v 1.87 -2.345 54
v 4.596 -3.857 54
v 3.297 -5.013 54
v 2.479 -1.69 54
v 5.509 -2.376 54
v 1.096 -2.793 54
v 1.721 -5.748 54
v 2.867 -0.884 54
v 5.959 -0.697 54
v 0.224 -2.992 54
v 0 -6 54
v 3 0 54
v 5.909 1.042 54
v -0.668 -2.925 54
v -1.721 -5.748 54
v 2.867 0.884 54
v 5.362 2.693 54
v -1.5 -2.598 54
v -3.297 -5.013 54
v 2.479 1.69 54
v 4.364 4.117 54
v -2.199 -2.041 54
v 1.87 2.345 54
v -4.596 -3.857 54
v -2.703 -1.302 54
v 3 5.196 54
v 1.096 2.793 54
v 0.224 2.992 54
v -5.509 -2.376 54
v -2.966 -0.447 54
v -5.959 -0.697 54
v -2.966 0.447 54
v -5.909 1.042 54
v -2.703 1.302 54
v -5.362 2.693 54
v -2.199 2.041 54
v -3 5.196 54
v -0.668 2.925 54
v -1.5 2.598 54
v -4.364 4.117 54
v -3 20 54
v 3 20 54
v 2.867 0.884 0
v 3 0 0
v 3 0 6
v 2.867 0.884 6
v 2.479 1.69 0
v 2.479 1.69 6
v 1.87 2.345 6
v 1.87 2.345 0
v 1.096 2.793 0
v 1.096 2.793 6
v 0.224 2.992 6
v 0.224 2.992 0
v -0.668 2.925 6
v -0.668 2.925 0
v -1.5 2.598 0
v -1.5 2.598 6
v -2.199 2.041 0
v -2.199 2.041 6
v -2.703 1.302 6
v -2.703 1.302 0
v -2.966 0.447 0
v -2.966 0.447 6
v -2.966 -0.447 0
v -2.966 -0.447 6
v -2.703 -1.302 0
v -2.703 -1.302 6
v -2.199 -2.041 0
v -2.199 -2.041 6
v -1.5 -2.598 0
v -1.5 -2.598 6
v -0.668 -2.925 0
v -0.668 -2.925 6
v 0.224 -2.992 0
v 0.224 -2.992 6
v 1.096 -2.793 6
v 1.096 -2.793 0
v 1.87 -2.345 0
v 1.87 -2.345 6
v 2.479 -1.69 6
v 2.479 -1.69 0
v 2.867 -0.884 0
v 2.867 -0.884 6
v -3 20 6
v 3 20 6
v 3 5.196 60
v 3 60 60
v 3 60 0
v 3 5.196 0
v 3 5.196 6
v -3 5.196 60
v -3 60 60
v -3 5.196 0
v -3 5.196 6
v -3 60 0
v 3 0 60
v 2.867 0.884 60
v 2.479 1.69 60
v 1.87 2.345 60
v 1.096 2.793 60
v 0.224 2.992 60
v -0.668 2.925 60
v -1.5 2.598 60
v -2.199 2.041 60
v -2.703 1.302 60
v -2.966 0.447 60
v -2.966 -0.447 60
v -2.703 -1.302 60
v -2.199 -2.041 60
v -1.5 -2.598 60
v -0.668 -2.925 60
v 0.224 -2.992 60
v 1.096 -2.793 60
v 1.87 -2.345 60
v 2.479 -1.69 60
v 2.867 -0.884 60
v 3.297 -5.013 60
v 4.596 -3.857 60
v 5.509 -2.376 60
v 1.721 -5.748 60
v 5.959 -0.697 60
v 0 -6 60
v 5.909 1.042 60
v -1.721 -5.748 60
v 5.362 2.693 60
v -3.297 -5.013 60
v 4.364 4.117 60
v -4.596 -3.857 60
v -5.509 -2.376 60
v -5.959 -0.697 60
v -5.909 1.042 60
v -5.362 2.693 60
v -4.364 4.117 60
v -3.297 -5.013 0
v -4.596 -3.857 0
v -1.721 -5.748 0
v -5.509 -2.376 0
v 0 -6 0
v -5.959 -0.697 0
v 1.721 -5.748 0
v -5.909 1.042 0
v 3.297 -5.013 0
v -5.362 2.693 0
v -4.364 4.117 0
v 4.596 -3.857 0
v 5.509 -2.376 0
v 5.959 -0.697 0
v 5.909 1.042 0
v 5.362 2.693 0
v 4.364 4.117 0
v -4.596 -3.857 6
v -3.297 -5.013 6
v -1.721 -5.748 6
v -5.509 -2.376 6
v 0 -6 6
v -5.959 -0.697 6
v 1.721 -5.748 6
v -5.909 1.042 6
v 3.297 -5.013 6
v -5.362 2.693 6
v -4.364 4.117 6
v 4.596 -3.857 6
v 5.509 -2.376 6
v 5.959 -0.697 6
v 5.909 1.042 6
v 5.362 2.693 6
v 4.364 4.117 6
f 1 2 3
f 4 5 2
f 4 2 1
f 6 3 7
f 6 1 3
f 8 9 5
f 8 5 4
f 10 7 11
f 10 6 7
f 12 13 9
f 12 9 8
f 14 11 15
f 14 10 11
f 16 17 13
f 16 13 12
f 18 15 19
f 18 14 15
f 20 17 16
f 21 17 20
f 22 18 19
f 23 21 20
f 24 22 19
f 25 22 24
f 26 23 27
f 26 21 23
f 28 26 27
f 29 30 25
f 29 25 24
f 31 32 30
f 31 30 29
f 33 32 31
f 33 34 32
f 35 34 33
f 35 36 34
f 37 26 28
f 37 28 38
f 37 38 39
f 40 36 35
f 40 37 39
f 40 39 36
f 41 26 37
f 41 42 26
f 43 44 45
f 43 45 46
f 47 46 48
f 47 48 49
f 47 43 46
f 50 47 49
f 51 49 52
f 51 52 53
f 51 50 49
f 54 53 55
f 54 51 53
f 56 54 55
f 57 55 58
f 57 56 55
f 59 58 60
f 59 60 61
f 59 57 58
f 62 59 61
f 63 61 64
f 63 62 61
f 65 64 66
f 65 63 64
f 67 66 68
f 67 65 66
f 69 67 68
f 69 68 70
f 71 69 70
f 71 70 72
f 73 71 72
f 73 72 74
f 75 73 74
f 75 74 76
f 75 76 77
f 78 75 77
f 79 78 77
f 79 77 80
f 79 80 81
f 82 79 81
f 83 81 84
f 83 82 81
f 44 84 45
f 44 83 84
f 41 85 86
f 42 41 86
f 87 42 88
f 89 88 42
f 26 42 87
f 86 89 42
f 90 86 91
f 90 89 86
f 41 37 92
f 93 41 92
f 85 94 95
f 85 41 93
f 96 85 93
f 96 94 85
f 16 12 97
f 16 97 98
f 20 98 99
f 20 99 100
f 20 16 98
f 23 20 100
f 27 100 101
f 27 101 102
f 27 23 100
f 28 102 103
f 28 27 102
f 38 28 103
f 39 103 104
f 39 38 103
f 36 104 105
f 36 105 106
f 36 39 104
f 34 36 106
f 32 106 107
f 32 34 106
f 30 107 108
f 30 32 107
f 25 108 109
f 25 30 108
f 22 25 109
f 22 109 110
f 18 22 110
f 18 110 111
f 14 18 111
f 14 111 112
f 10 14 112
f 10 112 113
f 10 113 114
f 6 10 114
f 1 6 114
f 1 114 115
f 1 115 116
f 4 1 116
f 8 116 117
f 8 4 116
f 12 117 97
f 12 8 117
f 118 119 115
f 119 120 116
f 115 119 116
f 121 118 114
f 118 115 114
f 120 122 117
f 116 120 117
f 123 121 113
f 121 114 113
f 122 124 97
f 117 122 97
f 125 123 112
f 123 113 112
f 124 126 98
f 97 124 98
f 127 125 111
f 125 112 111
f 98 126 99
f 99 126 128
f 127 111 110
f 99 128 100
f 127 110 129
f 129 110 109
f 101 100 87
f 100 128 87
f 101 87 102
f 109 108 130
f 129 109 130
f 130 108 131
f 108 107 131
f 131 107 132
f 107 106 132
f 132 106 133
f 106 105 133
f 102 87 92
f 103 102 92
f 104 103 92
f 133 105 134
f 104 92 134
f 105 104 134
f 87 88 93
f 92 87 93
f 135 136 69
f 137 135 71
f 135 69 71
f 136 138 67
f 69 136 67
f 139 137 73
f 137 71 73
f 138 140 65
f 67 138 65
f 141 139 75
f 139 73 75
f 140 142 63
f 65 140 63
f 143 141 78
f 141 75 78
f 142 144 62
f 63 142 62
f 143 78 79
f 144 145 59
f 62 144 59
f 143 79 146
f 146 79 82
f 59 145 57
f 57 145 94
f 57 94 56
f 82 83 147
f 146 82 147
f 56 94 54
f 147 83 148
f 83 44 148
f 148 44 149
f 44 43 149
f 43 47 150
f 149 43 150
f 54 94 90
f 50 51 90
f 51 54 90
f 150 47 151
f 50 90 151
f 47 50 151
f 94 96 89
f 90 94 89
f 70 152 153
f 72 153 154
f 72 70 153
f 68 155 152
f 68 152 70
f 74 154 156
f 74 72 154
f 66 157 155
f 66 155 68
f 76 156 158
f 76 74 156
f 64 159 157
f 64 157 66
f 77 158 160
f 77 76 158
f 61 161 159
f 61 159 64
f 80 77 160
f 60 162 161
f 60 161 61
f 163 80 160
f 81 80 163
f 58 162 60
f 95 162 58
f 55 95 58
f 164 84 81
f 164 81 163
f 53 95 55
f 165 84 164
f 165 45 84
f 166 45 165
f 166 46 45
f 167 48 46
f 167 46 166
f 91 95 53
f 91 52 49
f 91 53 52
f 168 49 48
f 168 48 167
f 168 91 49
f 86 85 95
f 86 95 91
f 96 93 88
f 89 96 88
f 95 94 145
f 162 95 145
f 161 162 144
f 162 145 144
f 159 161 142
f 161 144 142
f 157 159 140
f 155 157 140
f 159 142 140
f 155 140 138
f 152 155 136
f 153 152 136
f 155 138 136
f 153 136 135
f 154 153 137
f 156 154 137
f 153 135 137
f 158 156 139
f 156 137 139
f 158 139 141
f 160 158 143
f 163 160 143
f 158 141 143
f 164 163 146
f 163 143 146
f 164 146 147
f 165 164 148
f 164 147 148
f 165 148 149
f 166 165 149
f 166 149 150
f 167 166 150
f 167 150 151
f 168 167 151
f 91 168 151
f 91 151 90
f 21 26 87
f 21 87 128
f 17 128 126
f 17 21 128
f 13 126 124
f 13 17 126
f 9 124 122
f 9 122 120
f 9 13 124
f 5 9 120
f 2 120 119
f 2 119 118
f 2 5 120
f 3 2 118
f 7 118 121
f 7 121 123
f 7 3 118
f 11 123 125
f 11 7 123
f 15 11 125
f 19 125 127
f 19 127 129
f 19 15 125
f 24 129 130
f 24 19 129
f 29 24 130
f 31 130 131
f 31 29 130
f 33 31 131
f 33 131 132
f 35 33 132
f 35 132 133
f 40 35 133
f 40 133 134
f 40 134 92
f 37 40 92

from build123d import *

# Parameters (mm, degrees)
CROQUIS1_R              = 3
SALIENTE_EXTRUIR1_DEPTH = 6
CROQUIS2_W              = 6
CROQUIS2_H              = 40
SALIENTE_EXTRUIR2_DEPTH = 48
CROQUIS3_R              = 3
SALIENTE_EXTRUIR3_DEPTH = 6


with BuildPart() as part:
    # Croquis1 → Saliente-Extruir1 (new body)
    with BuildSketch(Plane.XY):
        with BuildLine():
            Line((3, 60), (-3, 60))
            Line((-3, 60), (-3, 5.196152423))
            ThreePointArc((-3, 5.196152423), (0, -6), (3, 5.196152423))
            Line((3, 5.196152423), (3, 60))
        make_face()
        Circle(CROQUIS1_R, mode=Mode.SUBTRACT)
    extrude(amount=SALIENTE_EXTRUIR1_DEPTH)

    # Croquis2 → Saliente-Extruir2 (add)
    with BuildSketch(Plane.XY.offset(6)):
        with Locations((0, 40)):
            Rectangle(CROQUIS2_W, CROQUIS2_H)
    extrude(amount=SALIENTE_EXTRUIR2_DEPTH)

    # Croquis3 → Saliente-Extruir3 (add)
    with BuildSketch(Plane.XY.offset(54)):
        with BuildLine():
            Line((-3, 5.196152423), (-3, 60))
            Line((-3, 60), (3, 60))
            Line((3, 60), (3, 5.196152423))
            ThreePointArc((3, 5.196152423), (0, -6), (-3, 5.196152423))
        make_face()
        Circle(CROQUIS3_R, mode=Mode.SUBTRACT)
    extrude(amount=SALIENTE_EXTRUIR3_DEPTH)


solid = part.part
